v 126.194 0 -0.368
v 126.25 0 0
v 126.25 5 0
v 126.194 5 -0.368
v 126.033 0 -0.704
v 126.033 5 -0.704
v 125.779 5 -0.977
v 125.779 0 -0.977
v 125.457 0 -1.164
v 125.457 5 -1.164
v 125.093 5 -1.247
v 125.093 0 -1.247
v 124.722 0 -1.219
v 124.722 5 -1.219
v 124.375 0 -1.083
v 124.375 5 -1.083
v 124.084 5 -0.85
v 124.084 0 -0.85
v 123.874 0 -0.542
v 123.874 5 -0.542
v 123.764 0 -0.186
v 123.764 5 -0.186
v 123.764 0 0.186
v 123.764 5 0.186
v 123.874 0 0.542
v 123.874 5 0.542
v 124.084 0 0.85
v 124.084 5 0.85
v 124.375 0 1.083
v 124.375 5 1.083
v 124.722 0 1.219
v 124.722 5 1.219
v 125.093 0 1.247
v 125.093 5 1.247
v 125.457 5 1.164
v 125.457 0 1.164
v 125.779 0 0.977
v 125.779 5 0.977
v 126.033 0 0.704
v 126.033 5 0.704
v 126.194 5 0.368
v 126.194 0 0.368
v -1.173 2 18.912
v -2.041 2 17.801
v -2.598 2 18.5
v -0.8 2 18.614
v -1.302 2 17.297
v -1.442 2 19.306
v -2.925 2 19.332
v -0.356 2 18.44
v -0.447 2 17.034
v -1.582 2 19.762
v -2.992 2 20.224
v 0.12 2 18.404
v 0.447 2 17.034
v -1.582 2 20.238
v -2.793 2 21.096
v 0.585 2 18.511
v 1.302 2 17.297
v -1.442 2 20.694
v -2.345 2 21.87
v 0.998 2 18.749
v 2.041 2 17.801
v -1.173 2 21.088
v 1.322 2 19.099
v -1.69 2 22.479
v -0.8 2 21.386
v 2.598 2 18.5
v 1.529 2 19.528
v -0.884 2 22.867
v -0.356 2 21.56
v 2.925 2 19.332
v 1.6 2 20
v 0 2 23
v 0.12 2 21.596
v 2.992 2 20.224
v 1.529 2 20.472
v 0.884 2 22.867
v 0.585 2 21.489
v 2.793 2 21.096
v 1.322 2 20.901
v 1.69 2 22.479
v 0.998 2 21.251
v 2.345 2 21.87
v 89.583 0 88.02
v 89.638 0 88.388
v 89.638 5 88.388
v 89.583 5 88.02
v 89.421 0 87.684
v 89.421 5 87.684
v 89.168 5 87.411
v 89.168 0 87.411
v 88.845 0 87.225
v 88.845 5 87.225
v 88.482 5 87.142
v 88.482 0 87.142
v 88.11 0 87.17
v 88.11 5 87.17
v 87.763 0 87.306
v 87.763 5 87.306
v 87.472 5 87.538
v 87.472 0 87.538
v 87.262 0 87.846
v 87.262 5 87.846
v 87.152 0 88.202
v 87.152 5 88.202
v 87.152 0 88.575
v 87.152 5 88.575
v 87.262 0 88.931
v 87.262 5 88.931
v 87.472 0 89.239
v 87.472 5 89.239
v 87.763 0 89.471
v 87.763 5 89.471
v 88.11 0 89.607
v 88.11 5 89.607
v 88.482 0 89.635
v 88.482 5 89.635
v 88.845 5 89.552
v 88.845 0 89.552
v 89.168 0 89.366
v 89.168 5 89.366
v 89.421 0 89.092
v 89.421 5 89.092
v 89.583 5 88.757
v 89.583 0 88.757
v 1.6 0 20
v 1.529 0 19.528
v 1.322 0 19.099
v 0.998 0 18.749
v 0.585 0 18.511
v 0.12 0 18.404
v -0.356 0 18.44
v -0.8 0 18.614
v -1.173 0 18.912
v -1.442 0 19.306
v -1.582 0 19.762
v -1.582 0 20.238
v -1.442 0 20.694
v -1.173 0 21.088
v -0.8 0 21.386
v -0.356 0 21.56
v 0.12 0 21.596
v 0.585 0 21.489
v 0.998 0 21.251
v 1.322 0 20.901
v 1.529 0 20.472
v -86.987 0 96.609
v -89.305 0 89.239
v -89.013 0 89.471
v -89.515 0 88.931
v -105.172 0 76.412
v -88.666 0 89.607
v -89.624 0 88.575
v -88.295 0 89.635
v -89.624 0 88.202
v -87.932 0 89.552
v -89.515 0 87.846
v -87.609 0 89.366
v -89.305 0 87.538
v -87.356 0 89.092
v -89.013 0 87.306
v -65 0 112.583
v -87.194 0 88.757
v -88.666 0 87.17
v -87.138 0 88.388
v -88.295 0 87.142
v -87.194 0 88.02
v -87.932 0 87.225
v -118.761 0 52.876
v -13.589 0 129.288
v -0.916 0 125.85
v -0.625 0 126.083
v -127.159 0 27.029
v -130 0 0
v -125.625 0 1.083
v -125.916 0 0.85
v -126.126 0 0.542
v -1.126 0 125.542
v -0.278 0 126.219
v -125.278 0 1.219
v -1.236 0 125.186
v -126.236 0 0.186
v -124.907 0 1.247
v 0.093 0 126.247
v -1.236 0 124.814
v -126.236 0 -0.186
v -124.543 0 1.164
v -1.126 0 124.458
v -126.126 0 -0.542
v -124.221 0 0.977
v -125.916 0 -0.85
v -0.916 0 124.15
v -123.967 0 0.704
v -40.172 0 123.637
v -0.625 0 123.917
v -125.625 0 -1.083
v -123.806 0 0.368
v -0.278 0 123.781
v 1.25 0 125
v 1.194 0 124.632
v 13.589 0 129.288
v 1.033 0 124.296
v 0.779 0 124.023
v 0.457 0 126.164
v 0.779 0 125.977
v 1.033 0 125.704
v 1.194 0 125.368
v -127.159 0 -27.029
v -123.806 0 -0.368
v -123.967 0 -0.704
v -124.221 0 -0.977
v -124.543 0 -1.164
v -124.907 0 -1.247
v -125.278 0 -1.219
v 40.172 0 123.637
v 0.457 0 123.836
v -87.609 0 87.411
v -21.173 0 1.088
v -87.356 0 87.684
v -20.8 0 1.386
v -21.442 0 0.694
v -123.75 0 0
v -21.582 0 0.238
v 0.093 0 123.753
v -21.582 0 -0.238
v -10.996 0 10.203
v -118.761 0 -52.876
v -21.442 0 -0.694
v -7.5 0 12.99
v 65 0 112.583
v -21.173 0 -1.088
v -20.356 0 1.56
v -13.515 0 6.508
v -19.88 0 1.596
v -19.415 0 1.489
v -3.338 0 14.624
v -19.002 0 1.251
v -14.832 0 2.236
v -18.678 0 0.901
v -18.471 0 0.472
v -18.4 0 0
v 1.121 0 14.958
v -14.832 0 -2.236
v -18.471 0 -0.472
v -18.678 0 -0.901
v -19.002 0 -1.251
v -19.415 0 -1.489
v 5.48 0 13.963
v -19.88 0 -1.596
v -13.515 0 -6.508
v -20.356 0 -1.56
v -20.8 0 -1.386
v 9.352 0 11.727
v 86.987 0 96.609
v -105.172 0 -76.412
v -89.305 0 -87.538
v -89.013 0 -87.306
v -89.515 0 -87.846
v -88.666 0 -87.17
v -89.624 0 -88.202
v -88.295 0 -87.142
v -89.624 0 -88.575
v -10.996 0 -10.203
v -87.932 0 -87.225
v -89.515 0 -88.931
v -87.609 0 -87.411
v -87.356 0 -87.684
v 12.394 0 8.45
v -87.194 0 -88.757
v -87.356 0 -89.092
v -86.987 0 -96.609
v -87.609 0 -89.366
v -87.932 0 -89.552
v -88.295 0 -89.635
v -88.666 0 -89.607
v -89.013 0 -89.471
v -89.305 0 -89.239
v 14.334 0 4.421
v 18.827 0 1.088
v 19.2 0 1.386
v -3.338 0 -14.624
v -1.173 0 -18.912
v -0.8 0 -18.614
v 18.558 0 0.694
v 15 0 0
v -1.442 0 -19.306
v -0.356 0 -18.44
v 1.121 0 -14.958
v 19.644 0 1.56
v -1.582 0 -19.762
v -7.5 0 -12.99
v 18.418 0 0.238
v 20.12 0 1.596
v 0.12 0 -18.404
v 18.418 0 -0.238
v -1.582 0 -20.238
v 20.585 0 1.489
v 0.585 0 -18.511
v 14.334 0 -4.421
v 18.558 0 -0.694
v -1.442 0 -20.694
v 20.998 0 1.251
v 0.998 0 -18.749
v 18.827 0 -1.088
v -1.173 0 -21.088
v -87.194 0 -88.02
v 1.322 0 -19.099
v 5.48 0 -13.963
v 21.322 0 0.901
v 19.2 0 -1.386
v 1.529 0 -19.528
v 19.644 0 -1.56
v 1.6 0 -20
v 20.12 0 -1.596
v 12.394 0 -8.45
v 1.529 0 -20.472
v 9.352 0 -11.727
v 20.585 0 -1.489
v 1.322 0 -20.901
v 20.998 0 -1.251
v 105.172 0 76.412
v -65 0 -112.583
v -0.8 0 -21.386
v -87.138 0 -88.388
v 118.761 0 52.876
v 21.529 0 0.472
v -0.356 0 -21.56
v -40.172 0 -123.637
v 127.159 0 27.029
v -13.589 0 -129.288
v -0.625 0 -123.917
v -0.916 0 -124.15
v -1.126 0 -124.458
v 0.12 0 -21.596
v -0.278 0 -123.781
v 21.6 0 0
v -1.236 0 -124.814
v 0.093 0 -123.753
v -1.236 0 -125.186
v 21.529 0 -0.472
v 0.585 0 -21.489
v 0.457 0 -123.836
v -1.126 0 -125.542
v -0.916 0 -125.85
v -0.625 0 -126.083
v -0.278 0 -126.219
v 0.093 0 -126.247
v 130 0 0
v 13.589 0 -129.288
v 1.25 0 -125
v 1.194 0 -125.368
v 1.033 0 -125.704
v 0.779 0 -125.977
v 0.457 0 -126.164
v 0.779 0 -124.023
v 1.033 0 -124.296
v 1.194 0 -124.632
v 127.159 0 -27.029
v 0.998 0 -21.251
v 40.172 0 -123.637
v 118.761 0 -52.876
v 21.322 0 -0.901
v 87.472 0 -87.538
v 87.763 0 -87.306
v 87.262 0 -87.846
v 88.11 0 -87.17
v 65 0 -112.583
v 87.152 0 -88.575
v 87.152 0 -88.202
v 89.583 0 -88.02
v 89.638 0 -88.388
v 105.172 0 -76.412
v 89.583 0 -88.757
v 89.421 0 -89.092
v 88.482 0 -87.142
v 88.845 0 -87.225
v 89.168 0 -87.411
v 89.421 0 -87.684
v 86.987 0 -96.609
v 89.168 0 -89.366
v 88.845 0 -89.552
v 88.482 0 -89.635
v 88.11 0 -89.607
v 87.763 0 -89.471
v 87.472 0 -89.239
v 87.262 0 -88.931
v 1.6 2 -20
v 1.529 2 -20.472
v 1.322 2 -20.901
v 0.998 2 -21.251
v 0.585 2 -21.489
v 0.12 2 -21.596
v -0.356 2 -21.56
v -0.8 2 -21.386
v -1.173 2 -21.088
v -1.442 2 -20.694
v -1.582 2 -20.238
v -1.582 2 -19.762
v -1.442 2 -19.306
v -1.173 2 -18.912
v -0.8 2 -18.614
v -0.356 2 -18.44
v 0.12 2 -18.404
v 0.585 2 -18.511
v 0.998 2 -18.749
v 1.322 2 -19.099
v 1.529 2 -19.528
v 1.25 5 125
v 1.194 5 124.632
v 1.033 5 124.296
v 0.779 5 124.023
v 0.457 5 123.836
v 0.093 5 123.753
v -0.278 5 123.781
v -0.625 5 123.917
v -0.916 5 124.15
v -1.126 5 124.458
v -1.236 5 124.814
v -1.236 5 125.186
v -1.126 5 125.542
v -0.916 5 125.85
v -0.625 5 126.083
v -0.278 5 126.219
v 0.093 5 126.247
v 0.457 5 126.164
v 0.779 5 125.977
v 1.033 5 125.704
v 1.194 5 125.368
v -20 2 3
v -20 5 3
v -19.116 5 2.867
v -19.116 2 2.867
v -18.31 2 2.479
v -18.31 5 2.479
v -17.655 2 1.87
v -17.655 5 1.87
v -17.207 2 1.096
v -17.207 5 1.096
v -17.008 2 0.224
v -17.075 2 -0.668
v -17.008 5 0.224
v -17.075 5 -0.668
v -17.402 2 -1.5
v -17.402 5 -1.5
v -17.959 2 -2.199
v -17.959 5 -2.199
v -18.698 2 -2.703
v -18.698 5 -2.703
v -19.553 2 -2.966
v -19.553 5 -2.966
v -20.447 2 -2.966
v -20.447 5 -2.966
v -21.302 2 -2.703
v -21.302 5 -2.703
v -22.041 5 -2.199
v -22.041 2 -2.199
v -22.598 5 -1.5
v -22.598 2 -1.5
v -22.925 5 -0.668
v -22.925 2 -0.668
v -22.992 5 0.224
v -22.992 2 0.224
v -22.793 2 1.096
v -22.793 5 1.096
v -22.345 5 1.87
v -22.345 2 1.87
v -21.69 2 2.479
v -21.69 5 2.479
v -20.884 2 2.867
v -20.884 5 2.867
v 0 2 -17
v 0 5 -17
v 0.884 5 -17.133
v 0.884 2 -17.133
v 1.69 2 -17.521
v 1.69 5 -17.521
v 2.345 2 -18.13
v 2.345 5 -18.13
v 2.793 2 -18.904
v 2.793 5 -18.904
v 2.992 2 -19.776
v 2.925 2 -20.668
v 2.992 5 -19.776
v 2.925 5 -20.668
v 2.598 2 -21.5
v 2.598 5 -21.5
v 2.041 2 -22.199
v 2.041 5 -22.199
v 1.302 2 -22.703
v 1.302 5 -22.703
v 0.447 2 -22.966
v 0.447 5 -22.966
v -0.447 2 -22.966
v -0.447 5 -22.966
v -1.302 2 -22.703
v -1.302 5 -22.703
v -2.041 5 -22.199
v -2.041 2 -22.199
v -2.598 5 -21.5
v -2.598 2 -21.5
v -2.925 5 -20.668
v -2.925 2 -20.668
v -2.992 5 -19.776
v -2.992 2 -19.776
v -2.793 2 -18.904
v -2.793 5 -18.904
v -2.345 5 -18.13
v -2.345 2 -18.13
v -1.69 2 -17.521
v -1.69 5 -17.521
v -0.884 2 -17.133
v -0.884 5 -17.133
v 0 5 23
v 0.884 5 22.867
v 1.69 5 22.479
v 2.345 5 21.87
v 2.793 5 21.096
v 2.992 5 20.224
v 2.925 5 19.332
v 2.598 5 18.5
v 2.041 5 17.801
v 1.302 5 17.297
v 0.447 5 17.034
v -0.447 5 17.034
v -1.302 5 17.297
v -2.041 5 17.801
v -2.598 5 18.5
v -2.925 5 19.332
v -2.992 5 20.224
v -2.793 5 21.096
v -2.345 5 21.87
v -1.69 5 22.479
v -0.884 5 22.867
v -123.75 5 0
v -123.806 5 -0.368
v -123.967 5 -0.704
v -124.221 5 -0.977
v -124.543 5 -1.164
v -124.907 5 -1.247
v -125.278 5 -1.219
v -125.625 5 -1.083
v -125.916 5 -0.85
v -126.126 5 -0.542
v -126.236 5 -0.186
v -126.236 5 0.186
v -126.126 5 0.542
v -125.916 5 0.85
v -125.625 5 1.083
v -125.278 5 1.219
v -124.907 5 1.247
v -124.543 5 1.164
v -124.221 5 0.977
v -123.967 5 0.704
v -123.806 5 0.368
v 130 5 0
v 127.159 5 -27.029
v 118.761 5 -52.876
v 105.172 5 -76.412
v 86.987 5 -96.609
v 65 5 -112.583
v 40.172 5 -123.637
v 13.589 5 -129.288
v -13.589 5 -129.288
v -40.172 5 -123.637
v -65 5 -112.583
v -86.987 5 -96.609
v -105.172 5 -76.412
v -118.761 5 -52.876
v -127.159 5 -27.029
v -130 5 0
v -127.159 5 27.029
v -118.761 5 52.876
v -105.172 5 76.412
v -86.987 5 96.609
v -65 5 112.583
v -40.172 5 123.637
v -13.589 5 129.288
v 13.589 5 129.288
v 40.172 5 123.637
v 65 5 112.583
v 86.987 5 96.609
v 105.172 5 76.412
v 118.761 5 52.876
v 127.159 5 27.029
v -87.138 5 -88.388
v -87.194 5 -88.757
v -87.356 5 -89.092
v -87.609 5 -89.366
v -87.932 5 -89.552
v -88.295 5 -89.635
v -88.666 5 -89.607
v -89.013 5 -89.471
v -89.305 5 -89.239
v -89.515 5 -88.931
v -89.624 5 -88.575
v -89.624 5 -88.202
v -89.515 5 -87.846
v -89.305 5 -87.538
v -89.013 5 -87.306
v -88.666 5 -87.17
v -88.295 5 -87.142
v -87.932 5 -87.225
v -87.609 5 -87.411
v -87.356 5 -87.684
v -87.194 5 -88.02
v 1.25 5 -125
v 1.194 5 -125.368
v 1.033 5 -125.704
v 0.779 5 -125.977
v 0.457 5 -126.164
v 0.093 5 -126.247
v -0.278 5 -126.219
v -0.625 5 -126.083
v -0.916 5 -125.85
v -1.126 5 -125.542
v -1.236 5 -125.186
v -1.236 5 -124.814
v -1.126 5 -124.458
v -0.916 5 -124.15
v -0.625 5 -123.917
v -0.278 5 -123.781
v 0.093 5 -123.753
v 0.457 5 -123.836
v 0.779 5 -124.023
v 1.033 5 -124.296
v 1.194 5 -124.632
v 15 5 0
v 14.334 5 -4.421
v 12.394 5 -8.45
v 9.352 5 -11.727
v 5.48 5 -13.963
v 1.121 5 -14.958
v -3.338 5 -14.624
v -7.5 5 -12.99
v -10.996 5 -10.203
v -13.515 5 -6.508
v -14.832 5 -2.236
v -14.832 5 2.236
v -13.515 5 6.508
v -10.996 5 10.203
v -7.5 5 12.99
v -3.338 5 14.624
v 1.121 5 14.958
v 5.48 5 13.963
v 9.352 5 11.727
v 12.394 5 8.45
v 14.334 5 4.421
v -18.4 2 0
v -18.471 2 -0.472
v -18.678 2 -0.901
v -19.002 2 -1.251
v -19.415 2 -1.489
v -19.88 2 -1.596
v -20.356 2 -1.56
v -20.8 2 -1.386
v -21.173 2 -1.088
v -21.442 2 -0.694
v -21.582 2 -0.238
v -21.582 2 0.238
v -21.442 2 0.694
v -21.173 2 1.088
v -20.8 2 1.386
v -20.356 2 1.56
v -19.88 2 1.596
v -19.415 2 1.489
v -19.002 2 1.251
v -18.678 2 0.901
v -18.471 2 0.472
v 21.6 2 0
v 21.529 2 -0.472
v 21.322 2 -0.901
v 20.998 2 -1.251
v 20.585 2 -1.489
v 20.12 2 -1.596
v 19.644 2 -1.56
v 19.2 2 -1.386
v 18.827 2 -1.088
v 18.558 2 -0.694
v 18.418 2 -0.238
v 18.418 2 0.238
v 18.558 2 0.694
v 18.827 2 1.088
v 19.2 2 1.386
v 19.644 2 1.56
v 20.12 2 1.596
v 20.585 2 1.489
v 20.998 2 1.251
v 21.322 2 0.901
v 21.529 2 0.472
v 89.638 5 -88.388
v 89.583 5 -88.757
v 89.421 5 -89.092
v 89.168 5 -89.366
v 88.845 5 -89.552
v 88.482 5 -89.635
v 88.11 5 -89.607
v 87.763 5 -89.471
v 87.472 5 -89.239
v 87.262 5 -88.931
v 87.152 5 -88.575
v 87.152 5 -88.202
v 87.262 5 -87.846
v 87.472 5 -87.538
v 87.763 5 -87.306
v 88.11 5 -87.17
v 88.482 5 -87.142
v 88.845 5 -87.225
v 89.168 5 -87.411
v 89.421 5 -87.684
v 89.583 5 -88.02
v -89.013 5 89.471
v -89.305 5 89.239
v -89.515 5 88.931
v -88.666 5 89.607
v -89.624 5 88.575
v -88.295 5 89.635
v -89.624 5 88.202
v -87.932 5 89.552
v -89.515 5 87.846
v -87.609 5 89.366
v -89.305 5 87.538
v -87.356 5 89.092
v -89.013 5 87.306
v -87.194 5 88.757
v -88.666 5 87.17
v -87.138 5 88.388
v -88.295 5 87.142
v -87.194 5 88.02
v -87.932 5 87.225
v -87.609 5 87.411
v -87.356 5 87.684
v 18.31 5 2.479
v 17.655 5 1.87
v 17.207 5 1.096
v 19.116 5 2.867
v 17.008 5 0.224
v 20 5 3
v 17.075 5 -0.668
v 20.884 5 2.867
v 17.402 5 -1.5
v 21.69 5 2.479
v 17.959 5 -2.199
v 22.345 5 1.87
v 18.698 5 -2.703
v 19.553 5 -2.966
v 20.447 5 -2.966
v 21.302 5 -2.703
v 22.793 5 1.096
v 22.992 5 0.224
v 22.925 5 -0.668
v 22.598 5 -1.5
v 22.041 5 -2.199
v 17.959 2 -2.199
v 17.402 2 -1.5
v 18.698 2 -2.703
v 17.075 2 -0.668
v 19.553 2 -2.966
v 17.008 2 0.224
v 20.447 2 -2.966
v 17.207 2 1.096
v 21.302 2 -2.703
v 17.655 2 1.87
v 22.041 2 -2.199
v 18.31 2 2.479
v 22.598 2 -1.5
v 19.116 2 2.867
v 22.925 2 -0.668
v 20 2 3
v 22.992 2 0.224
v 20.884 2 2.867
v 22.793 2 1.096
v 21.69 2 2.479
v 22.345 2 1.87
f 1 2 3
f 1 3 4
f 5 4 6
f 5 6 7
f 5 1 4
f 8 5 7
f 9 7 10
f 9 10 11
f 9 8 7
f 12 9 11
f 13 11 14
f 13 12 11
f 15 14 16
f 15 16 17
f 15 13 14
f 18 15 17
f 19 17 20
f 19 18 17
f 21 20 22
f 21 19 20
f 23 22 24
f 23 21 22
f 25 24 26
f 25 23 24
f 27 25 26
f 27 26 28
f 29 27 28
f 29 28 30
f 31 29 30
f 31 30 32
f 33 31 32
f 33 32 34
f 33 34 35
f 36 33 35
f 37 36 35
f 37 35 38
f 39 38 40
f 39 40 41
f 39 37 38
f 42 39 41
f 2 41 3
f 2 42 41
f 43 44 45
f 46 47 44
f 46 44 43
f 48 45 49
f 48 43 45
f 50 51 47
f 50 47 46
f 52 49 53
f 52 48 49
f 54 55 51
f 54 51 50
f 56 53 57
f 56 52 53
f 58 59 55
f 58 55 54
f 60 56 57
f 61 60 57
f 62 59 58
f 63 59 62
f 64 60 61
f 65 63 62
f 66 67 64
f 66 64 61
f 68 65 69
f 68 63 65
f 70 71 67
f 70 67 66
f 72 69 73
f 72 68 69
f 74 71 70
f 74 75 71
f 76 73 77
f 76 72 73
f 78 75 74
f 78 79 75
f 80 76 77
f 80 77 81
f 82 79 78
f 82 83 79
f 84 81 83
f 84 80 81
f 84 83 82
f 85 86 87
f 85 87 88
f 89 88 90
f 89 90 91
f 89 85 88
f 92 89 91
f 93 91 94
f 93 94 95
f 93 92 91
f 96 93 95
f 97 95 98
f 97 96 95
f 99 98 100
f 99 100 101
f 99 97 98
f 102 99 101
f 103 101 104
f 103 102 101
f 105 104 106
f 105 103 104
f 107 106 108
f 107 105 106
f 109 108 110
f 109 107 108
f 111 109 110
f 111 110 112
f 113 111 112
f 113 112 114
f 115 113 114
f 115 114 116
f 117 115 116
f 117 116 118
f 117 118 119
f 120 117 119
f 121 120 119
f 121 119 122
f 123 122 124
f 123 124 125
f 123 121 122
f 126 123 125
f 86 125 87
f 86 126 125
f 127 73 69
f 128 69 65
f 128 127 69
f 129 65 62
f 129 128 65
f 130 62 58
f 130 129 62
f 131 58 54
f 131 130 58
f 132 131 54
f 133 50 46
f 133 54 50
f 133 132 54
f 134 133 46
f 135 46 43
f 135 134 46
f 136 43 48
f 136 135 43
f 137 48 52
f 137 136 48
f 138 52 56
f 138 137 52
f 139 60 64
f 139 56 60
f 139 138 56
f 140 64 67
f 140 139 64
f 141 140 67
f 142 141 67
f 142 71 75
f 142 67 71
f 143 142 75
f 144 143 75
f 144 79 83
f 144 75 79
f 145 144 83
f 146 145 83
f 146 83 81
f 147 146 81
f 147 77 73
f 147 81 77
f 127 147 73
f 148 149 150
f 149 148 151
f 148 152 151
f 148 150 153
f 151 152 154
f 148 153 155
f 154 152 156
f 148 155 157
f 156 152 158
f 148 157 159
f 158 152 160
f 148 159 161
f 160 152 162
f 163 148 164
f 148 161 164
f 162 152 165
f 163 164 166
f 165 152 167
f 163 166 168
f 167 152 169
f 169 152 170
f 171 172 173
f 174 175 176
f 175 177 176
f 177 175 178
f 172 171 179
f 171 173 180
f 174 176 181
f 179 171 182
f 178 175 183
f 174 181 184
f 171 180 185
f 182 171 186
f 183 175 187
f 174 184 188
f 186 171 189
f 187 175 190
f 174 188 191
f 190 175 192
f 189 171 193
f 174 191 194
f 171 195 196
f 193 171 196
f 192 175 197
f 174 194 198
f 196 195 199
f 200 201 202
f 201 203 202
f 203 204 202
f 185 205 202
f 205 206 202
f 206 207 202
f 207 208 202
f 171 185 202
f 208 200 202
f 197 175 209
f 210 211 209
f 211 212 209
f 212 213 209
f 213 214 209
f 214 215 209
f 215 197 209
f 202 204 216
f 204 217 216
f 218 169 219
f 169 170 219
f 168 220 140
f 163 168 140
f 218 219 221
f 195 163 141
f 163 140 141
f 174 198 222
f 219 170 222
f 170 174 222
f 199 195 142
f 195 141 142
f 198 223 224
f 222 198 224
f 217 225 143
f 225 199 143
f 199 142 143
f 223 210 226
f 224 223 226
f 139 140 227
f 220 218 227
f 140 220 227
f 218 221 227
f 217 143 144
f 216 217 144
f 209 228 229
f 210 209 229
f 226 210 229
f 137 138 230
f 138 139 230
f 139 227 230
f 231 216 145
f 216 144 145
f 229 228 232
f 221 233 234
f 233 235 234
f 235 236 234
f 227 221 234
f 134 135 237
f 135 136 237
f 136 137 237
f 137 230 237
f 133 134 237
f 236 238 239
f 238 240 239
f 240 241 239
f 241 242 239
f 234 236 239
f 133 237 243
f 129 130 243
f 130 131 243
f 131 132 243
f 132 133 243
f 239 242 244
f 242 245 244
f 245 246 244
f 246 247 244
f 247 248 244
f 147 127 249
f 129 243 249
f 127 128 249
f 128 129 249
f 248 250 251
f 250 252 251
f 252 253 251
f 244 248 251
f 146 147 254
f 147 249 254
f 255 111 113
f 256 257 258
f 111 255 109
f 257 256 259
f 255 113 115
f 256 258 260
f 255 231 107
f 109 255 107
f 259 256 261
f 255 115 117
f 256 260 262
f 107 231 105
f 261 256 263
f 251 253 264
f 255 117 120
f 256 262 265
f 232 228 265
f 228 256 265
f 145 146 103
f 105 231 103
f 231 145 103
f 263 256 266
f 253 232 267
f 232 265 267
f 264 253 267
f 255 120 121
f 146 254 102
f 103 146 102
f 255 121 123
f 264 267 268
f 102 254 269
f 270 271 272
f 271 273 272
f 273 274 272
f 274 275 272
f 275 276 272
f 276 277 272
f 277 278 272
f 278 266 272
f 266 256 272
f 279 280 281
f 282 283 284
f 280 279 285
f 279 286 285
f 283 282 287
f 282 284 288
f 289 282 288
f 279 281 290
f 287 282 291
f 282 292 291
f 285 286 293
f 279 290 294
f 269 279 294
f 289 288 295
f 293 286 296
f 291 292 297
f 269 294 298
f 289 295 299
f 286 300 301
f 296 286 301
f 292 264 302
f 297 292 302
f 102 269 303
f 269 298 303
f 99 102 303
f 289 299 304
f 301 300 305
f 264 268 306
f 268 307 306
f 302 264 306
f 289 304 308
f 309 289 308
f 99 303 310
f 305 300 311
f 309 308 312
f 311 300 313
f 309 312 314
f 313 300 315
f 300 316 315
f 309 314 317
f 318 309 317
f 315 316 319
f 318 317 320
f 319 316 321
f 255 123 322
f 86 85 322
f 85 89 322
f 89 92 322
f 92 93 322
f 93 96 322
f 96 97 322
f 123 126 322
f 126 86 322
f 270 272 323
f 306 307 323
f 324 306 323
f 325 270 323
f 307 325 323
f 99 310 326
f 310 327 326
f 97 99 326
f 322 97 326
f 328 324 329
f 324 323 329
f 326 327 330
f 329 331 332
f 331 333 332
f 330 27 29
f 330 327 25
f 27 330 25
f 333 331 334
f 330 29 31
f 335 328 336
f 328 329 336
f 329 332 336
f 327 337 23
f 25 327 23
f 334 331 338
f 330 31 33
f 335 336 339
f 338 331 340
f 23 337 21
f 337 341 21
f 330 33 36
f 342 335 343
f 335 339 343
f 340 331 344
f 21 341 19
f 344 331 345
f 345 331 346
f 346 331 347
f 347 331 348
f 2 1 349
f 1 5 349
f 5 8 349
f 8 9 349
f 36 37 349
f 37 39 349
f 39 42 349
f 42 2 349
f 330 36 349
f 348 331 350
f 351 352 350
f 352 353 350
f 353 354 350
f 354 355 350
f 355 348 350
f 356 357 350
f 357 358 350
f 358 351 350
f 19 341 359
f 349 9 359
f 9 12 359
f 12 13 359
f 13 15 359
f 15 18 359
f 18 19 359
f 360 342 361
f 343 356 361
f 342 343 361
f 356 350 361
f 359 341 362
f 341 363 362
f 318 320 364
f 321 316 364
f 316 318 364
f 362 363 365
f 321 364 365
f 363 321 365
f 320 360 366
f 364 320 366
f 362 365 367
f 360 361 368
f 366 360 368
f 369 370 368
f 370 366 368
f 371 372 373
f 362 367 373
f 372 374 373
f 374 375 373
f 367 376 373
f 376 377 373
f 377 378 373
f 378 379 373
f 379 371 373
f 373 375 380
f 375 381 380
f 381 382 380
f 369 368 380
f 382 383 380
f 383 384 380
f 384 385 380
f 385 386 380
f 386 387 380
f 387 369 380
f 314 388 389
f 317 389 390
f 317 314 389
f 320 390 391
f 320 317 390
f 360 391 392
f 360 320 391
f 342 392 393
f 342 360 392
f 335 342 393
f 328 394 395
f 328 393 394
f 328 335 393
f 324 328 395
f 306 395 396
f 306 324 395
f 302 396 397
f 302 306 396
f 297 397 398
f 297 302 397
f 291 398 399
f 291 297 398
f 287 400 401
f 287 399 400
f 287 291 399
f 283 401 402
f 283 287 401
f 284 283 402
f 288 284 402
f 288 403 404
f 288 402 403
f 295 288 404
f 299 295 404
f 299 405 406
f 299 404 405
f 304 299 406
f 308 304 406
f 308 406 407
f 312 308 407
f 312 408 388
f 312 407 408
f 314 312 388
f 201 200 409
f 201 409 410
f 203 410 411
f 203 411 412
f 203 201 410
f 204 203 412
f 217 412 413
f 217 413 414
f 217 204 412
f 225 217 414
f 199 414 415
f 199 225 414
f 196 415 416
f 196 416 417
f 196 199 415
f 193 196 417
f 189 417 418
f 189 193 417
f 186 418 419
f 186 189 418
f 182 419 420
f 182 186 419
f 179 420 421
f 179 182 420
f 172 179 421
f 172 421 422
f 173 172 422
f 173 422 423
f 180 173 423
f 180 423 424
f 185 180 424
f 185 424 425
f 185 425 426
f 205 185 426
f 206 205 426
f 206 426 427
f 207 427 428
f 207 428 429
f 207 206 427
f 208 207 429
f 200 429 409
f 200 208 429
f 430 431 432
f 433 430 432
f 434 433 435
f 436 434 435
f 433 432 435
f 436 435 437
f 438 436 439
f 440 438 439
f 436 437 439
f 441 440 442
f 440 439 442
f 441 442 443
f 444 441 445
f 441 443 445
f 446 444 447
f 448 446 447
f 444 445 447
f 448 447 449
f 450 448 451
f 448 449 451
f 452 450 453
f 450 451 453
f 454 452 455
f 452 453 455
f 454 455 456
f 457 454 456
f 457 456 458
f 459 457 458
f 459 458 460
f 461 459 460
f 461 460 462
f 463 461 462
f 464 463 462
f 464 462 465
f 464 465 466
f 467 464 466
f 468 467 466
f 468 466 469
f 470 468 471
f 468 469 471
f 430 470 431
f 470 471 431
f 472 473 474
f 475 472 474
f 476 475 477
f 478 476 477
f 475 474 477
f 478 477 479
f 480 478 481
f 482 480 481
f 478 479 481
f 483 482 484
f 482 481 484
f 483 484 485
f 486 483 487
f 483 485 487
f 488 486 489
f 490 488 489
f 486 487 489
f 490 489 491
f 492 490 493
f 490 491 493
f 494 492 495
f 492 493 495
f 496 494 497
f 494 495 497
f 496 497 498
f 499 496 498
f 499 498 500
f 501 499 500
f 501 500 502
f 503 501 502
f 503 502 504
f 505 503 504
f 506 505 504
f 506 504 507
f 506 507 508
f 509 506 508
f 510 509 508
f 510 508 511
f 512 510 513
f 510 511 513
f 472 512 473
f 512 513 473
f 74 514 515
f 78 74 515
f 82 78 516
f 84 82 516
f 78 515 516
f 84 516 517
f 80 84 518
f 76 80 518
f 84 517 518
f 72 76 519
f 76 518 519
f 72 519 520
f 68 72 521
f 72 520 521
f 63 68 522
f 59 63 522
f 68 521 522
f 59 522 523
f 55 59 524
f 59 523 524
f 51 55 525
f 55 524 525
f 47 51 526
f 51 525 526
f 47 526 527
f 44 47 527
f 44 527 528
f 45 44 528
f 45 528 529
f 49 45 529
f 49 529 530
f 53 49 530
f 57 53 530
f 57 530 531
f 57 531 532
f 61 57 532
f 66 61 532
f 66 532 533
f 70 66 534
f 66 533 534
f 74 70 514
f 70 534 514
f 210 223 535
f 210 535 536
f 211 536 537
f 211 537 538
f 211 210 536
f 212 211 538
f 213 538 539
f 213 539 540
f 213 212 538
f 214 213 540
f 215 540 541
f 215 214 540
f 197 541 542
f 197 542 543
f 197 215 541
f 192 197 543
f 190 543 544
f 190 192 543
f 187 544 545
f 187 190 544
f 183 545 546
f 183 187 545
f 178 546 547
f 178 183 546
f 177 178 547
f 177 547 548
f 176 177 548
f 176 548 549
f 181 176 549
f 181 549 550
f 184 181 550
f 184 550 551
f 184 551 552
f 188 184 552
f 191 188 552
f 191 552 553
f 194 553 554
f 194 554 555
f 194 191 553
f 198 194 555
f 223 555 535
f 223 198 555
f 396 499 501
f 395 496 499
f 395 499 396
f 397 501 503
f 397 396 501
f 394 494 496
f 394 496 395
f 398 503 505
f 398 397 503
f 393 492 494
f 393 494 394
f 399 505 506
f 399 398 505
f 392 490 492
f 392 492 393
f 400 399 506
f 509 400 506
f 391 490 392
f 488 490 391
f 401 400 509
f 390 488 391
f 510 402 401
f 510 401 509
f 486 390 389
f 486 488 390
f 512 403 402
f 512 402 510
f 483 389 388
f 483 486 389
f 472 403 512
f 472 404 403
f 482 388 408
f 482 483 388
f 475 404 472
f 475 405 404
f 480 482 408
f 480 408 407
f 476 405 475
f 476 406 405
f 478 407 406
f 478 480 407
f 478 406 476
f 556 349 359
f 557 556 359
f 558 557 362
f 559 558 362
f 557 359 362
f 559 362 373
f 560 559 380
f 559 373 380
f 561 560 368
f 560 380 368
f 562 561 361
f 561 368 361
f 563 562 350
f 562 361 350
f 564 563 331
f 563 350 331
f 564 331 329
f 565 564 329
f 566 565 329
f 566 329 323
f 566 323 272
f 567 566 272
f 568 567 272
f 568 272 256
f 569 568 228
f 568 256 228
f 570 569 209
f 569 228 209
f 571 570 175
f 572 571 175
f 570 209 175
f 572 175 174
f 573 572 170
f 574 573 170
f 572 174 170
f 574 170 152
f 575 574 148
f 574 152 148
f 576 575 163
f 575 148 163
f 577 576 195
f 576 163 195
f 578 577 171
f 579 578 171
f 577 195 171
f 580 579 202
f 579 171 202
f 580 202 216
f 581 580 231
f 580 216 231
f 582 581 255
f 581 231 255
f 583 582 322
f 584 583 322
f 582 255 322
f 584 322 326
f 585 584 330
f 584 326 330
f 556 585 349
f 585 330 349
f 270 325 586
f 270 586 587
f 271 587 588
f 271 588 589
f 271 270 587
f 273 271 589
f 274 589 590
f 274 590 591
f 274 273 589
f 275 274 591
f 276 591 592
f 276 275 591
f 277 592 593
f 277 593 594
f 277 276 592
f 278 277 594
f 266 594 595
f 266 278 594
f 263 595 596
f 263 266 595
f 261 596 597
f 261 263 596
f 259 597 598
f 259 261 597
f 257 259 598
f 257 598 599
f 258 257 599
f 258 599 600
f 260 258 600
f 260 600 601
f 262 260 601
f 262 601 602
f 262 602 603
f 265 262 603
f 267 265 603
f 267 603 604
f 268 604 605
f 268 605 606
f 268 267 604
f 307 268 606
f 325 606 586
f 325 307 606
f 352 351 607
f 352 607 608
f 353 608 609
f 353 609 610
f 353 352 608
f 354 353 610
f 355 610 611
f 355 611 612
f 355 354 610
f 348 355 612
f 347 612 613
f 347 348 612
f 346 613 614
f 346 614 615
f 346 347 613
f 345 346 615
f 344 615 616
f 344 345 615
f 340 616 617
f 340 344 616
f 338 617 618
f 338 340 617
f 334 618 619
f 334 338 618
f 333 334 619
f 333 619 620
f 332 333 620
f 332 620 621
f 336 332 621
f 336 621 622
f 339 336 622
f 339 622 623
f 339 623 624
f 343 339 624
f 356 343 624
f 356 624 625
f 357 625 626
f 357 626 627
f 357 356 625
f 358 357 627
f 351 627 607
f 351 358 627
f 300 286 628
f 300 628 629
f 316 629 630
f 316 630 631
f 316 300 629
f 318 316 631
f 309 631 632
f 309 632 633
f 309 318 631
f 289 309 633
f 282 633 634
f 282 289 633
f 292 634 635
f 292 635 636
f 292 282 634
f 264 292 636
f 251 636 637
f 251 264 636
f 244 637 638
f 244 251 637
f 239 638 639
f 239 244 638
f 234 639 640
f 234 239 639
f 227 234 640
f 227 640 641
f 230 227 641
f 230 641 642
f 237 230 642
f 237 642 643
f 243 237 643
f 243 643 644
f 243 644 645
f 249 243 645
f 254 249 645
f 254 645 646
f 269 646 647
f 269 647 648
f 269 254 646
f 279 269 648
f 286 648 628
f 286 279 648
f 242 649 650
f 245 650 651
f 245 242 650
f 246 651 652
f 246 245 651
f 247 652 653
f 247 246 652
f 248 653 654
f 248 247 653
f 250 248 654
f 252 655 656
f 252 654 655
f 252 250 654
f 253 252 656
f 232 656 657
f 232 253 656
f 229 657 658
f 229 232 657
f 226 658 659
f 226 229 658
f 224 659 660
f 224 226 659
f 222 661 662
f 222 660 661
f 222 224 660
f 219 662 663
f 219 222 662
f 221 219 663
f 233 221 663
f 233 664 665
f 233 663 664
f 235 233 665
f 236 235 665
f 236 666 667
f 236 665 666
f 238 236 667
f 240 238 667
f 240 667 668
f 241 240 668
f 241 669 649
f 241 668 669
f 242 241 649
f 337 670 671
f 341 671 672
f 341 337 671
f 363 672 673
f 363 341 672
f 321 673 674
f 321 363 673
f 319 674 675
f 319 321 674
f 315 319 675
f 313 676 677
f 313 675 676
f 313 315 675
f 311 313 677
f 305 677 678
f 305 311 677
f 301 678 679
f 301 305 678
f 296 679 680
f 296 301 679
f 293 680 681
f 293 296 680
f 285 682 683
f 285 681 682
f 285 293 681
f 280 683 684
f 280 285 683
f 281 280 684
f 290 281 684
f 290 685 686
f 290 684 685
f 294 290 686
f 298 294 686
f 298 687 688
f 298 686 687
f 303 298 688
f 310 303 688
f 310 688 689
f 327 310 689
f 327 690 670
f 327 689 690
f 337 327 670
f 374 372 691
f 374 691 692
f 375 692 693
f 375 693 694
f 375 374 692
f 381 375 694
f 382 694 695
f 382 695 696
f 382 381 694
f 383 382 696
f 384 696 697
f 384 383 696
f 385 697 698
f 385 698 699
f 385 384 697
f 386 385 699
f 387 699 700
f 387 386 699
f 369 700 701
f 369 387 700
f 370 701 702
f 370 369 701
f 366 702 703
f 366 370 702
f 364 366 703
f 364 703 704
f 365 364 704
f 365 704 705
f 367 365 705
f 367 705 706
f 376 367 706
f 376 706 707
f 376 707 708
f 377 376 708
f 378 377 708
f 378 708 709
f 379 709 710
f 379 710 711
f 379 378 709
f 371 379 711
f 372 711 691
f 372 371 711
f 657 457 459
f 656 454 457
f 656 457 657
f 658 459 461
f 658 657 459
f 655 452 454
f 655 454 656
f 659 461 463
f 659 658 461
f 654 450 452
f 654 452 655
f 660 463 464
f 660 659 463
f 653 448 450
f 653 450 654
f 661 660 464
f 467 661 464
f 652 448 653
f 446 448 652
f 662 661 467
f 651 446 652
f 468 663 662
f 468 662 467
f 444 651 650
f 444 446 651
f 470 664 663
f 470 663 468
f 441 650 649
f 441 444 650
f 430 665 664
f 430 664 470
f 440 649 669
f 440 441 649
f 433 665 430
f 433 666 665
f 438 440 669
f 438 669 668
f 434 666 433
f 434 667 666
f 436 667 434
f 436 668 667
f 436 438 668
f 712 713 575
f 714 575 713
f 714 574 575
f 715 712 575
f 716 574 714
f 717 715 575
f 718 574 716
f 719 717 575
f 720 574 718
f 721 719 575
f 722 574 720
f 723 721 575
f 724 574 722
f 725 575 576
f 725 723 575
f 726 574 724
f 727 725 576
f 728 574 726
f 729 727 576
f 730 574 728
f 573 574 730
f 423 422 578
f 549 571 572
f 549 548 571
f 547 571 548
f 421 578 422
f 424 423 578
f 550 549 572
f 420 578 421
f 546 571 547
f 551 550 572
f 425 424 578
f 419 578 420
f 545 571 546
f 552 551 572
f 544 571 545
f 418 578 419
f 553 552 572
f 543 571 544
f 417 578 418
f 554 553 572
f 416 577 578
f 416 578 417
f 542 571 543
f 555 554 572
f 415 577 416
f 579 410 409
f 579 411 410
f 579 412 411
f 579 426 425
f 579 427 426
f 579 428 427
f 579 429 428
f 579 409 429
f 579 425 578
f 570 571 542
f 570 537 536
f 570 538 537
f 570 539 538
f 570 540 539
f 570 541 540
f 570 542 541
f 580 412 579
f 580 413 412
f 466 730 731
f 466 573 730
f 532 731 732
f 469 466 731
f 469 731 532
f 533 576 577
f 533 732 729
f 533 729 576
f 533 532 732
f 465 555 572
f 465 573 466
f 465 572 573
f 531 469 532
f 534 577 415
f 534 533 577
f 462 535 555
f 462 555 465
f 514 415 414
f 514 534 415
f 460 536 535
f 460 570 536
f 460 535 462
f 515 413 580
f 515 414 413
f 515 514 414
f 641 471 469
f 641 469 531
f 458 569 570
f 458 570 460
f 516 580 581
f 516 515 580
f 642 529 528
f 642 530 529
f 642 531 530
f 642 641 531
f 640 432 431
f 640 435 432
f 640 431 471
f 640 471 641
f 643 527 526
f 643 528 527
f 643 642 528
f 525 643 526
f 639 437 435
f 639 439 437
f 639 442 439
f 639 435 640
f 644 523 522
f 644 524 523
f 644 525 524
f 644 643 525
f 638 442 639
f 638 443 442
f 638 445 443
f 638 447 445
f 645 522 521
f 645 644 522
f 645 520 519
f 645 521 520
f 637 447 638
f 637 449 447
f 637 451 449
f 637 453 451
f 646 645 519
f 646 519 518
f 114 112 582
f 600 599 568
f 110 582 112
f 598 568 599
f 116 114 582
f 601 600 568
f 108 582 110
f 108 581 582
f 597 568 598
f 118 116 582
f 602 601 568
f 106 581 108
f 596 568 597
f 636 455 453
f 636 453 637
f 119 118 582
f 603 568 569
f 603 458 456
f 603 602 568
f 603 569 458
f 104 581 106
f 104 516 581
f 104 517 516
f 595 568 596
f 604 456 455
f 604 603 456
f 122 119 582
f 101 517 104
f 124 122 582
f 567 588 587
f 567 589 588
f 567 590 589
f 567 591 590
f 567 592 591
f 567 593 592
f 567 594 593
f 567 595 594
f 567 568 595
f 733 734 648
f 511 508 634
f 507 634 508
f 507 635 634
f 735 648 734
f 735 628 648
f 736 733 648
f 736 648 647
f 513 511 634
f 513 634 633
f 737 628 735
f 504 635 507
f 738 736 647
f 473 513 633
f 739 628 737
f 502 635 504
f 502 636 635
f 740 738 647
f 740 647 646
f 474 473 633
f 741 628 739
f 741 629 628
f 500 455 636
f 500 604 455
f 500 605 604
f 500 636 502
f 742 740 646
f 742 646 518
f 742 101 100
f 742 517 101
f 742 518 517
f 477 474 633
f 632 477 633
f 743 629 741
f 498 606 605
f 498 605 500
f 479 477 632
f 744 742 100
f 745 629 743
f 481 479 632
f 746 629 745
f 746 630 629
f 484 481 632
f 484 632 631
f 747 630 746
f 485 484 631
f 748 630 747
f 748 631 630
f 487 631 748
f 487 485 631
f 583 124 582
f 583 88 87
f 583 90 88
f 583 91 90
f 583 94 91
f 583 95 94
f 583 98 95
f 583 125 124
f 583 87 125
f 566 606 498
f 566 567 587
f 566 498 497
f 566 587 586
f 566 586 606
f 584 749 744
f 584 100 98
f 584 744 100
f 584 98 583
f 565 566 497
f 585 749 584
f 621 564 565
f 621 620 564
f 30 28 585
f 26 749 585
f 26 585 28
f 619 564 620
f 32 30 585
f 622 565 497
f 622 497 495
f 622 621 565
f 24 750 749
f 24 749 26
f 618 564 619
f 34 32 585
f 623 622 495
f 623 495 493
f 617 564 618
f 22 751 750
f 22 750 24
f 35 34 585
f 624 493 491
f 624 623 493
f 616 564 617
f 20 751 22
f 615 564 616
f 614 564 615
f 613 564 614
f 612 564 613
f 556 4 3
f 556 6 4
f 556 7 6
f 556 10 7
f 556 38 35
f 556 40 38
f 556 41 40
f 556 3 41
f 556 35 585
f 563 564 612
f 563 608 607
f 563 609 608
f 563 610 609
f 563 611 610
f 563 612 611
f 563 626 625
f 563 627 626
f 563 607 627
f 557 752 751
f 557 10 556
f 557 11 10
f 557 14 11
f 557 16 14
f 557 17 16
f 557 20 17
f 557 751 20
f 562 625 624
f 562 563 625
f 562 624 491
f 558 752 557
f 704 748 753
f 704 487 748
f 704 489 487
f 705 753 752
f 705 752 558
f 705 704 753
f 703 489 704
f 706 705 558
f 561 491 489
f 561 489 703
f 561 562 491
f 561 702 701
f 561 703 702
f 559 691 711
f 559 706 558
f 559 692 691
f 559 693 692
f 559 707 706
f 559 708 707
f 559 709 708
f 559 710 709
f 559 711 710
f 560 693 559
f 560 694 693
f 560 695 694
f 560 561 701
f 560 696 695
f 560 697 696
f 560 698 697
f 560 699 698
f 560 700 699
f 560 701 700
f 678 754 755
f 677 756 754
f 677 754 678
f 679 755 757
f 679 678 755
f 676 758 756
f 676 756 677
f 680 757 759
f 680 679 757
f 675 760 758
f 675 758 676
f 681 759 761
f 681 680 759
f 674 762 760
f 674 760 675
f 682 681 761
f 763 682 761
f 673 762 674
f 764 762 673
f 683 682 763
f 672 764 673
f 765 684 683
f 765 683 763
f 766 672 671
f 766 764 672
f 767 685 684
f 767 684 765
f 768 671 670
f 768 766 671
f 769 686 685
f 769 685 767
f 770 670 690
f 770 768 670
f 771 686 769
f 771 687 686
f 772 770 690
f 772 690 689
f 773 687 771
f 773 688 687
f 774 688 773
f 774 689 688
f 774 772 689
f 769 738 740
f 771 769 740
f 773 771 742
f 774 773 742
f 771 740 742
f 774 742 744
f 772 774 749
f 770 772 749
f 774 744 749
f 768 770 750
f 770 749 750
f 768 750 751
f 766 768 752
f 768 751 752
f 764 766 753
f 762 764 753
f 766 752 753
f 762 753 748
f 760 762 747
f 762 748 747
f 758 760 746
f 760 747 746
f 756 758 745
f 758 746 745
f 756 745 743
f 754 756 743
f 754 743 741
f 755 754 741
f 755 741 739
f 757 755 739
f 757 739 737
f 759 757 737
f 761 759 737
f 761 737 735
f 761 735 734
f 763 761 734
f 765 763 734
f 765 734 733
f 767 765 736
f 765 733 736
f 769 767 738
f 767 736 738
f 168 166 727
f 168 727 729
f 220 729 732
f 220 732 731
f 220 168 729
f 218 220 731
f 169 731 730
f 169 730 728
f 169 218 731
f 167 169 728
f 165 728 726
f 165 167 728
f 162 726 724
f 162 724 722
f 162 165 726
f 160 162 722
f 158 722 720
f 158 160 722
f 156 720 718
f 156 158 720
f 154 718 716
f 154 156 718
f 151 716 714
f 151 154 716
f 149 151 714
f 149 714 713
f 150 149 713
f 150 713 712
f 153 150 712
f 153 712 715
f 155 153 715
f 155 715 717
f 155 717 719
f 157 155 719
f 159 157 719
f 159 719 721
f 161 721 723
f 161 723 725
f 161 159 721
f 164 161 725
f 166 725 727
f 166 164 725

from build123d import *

# Parameters (mm, degrees)
EXTRUDE_1_OUTLINE_R   = 130
EXTRUDE_1_OUTLINE_R_2 = 1.25
EXTRUDE_1_OUTLINE_R_3 = 1.6
EXTRUDE_1_OUTLINE_R_4 = 15
EXTRUDE_1_DEPTH       = 5
SKETCH_2_R            = 3
CUT_EXTRUDE_1_DEPTH   = 3


# Read off the part's stored shape, not the designer's step: ﾎﾞｽ - 押し出し1
with BuildPart() as part:
    # ﾎﾞｽ - 押し出し1 outline → ﾎﾞｽ - 押し出し1 (new body)
    with BuildSketch(Plane(origin=(0, 0, 0), x_dir=(1, 0, 0), z_dir=(0, 1, 0))):
        Circle(EXTRUDE_1_OUTLINE_R)
        with Locations((-88.388347648, -88.388347648)):
            Circle(EXTRUDE_1_OUTLINE_R_2, mode=Mode.SUBTRACT)
        with Locations((0, -125)):
            Circle(EXTRUDE_1_OUTLINE_R_2, mode=Mode.SUBTRACT)
        with Locations((88.388347648, -88.388347648)):
            Circle(EXTRUDE_1_OUTLINE_R_2, mode=Mode.SUBTRACT)
        with Locations((0, -20)):
            Circle(EXTRUDE_1_OUTLINE_R_3, mode=Mode.SUBTRACT)
        with Locations((-125, 0)):
            Circle(EXTRUDE_1_OUTLINE_R_2, mode=Mode.SUBTRACT)
        with Locations((-20, 0)):
            Circle(EXTRUDE_1_OUTLINE_R_3, mode=Mode.SUBTRACT)
        with Locations((-88.388347648, 88.388347648)):
            Circle(EXTRUDE_1_OUTLINE_R_2, mode=Mode.SUBTRACT)
        Circle(EXTRUDE_1_OUTLINE_R_4, mode=Mode.SUBTRACT)
        with Locations((20, 0)):
            Circle(EXTRUDE_1_OUTLINE_R_3, mode=Mode.SUBTRACT)
        with Locations((0, 20)):
            Circle(EXTRUDE_1_OUTLINE_R_3, mode=Mode.SUBTRACT)
        with Locations((125, 0)):
            Circle(EXTRUDE_1_OUTLINE_R_2, mode=Mode.SUBTRACT)
        with Locations((0, 125)):
            Circle(EXTRUDE_1_OUTLINE_R_2, mode=Mode.SUBTRACT)
        with Locations((88.388347648, 88.388347648)):
            Circle(EXTRUDE_1_OUTLINE_R_2, mode=Mode.SUBTRACT)
    extrude(amount=EXTRUDE_1_DEPTH)

    # ｽｹｯﾁ2 → ｶｯﾄ - 押し出し1 (cut)
    with BuildSketch(Plane(origin=(0, 5, 0), x_dir=(1, 0, 0), z_dir=(0, 1, 0))):
        with Locations(Location((0, 20, 0), (0, 0, 270))):
            Circle(SKETCH_2_R)
        with Locations(Location((20, 0, 0), (0, 0, 270))):
            Circle(SKETCH_2_R)
        with Locations(Location((0, -20, 0), (0, 0, 270))):
            Circle(SKETCH_2_R)
        with Locations(Location((-20, 0, 0), (0, 0, 270))):
            Circle(SKETCH_2_R)
    extrude(amount=-CUT_EXTRUDE_1_DEPTH, mode=Mode.SUBTRACT)


solid = part.part
